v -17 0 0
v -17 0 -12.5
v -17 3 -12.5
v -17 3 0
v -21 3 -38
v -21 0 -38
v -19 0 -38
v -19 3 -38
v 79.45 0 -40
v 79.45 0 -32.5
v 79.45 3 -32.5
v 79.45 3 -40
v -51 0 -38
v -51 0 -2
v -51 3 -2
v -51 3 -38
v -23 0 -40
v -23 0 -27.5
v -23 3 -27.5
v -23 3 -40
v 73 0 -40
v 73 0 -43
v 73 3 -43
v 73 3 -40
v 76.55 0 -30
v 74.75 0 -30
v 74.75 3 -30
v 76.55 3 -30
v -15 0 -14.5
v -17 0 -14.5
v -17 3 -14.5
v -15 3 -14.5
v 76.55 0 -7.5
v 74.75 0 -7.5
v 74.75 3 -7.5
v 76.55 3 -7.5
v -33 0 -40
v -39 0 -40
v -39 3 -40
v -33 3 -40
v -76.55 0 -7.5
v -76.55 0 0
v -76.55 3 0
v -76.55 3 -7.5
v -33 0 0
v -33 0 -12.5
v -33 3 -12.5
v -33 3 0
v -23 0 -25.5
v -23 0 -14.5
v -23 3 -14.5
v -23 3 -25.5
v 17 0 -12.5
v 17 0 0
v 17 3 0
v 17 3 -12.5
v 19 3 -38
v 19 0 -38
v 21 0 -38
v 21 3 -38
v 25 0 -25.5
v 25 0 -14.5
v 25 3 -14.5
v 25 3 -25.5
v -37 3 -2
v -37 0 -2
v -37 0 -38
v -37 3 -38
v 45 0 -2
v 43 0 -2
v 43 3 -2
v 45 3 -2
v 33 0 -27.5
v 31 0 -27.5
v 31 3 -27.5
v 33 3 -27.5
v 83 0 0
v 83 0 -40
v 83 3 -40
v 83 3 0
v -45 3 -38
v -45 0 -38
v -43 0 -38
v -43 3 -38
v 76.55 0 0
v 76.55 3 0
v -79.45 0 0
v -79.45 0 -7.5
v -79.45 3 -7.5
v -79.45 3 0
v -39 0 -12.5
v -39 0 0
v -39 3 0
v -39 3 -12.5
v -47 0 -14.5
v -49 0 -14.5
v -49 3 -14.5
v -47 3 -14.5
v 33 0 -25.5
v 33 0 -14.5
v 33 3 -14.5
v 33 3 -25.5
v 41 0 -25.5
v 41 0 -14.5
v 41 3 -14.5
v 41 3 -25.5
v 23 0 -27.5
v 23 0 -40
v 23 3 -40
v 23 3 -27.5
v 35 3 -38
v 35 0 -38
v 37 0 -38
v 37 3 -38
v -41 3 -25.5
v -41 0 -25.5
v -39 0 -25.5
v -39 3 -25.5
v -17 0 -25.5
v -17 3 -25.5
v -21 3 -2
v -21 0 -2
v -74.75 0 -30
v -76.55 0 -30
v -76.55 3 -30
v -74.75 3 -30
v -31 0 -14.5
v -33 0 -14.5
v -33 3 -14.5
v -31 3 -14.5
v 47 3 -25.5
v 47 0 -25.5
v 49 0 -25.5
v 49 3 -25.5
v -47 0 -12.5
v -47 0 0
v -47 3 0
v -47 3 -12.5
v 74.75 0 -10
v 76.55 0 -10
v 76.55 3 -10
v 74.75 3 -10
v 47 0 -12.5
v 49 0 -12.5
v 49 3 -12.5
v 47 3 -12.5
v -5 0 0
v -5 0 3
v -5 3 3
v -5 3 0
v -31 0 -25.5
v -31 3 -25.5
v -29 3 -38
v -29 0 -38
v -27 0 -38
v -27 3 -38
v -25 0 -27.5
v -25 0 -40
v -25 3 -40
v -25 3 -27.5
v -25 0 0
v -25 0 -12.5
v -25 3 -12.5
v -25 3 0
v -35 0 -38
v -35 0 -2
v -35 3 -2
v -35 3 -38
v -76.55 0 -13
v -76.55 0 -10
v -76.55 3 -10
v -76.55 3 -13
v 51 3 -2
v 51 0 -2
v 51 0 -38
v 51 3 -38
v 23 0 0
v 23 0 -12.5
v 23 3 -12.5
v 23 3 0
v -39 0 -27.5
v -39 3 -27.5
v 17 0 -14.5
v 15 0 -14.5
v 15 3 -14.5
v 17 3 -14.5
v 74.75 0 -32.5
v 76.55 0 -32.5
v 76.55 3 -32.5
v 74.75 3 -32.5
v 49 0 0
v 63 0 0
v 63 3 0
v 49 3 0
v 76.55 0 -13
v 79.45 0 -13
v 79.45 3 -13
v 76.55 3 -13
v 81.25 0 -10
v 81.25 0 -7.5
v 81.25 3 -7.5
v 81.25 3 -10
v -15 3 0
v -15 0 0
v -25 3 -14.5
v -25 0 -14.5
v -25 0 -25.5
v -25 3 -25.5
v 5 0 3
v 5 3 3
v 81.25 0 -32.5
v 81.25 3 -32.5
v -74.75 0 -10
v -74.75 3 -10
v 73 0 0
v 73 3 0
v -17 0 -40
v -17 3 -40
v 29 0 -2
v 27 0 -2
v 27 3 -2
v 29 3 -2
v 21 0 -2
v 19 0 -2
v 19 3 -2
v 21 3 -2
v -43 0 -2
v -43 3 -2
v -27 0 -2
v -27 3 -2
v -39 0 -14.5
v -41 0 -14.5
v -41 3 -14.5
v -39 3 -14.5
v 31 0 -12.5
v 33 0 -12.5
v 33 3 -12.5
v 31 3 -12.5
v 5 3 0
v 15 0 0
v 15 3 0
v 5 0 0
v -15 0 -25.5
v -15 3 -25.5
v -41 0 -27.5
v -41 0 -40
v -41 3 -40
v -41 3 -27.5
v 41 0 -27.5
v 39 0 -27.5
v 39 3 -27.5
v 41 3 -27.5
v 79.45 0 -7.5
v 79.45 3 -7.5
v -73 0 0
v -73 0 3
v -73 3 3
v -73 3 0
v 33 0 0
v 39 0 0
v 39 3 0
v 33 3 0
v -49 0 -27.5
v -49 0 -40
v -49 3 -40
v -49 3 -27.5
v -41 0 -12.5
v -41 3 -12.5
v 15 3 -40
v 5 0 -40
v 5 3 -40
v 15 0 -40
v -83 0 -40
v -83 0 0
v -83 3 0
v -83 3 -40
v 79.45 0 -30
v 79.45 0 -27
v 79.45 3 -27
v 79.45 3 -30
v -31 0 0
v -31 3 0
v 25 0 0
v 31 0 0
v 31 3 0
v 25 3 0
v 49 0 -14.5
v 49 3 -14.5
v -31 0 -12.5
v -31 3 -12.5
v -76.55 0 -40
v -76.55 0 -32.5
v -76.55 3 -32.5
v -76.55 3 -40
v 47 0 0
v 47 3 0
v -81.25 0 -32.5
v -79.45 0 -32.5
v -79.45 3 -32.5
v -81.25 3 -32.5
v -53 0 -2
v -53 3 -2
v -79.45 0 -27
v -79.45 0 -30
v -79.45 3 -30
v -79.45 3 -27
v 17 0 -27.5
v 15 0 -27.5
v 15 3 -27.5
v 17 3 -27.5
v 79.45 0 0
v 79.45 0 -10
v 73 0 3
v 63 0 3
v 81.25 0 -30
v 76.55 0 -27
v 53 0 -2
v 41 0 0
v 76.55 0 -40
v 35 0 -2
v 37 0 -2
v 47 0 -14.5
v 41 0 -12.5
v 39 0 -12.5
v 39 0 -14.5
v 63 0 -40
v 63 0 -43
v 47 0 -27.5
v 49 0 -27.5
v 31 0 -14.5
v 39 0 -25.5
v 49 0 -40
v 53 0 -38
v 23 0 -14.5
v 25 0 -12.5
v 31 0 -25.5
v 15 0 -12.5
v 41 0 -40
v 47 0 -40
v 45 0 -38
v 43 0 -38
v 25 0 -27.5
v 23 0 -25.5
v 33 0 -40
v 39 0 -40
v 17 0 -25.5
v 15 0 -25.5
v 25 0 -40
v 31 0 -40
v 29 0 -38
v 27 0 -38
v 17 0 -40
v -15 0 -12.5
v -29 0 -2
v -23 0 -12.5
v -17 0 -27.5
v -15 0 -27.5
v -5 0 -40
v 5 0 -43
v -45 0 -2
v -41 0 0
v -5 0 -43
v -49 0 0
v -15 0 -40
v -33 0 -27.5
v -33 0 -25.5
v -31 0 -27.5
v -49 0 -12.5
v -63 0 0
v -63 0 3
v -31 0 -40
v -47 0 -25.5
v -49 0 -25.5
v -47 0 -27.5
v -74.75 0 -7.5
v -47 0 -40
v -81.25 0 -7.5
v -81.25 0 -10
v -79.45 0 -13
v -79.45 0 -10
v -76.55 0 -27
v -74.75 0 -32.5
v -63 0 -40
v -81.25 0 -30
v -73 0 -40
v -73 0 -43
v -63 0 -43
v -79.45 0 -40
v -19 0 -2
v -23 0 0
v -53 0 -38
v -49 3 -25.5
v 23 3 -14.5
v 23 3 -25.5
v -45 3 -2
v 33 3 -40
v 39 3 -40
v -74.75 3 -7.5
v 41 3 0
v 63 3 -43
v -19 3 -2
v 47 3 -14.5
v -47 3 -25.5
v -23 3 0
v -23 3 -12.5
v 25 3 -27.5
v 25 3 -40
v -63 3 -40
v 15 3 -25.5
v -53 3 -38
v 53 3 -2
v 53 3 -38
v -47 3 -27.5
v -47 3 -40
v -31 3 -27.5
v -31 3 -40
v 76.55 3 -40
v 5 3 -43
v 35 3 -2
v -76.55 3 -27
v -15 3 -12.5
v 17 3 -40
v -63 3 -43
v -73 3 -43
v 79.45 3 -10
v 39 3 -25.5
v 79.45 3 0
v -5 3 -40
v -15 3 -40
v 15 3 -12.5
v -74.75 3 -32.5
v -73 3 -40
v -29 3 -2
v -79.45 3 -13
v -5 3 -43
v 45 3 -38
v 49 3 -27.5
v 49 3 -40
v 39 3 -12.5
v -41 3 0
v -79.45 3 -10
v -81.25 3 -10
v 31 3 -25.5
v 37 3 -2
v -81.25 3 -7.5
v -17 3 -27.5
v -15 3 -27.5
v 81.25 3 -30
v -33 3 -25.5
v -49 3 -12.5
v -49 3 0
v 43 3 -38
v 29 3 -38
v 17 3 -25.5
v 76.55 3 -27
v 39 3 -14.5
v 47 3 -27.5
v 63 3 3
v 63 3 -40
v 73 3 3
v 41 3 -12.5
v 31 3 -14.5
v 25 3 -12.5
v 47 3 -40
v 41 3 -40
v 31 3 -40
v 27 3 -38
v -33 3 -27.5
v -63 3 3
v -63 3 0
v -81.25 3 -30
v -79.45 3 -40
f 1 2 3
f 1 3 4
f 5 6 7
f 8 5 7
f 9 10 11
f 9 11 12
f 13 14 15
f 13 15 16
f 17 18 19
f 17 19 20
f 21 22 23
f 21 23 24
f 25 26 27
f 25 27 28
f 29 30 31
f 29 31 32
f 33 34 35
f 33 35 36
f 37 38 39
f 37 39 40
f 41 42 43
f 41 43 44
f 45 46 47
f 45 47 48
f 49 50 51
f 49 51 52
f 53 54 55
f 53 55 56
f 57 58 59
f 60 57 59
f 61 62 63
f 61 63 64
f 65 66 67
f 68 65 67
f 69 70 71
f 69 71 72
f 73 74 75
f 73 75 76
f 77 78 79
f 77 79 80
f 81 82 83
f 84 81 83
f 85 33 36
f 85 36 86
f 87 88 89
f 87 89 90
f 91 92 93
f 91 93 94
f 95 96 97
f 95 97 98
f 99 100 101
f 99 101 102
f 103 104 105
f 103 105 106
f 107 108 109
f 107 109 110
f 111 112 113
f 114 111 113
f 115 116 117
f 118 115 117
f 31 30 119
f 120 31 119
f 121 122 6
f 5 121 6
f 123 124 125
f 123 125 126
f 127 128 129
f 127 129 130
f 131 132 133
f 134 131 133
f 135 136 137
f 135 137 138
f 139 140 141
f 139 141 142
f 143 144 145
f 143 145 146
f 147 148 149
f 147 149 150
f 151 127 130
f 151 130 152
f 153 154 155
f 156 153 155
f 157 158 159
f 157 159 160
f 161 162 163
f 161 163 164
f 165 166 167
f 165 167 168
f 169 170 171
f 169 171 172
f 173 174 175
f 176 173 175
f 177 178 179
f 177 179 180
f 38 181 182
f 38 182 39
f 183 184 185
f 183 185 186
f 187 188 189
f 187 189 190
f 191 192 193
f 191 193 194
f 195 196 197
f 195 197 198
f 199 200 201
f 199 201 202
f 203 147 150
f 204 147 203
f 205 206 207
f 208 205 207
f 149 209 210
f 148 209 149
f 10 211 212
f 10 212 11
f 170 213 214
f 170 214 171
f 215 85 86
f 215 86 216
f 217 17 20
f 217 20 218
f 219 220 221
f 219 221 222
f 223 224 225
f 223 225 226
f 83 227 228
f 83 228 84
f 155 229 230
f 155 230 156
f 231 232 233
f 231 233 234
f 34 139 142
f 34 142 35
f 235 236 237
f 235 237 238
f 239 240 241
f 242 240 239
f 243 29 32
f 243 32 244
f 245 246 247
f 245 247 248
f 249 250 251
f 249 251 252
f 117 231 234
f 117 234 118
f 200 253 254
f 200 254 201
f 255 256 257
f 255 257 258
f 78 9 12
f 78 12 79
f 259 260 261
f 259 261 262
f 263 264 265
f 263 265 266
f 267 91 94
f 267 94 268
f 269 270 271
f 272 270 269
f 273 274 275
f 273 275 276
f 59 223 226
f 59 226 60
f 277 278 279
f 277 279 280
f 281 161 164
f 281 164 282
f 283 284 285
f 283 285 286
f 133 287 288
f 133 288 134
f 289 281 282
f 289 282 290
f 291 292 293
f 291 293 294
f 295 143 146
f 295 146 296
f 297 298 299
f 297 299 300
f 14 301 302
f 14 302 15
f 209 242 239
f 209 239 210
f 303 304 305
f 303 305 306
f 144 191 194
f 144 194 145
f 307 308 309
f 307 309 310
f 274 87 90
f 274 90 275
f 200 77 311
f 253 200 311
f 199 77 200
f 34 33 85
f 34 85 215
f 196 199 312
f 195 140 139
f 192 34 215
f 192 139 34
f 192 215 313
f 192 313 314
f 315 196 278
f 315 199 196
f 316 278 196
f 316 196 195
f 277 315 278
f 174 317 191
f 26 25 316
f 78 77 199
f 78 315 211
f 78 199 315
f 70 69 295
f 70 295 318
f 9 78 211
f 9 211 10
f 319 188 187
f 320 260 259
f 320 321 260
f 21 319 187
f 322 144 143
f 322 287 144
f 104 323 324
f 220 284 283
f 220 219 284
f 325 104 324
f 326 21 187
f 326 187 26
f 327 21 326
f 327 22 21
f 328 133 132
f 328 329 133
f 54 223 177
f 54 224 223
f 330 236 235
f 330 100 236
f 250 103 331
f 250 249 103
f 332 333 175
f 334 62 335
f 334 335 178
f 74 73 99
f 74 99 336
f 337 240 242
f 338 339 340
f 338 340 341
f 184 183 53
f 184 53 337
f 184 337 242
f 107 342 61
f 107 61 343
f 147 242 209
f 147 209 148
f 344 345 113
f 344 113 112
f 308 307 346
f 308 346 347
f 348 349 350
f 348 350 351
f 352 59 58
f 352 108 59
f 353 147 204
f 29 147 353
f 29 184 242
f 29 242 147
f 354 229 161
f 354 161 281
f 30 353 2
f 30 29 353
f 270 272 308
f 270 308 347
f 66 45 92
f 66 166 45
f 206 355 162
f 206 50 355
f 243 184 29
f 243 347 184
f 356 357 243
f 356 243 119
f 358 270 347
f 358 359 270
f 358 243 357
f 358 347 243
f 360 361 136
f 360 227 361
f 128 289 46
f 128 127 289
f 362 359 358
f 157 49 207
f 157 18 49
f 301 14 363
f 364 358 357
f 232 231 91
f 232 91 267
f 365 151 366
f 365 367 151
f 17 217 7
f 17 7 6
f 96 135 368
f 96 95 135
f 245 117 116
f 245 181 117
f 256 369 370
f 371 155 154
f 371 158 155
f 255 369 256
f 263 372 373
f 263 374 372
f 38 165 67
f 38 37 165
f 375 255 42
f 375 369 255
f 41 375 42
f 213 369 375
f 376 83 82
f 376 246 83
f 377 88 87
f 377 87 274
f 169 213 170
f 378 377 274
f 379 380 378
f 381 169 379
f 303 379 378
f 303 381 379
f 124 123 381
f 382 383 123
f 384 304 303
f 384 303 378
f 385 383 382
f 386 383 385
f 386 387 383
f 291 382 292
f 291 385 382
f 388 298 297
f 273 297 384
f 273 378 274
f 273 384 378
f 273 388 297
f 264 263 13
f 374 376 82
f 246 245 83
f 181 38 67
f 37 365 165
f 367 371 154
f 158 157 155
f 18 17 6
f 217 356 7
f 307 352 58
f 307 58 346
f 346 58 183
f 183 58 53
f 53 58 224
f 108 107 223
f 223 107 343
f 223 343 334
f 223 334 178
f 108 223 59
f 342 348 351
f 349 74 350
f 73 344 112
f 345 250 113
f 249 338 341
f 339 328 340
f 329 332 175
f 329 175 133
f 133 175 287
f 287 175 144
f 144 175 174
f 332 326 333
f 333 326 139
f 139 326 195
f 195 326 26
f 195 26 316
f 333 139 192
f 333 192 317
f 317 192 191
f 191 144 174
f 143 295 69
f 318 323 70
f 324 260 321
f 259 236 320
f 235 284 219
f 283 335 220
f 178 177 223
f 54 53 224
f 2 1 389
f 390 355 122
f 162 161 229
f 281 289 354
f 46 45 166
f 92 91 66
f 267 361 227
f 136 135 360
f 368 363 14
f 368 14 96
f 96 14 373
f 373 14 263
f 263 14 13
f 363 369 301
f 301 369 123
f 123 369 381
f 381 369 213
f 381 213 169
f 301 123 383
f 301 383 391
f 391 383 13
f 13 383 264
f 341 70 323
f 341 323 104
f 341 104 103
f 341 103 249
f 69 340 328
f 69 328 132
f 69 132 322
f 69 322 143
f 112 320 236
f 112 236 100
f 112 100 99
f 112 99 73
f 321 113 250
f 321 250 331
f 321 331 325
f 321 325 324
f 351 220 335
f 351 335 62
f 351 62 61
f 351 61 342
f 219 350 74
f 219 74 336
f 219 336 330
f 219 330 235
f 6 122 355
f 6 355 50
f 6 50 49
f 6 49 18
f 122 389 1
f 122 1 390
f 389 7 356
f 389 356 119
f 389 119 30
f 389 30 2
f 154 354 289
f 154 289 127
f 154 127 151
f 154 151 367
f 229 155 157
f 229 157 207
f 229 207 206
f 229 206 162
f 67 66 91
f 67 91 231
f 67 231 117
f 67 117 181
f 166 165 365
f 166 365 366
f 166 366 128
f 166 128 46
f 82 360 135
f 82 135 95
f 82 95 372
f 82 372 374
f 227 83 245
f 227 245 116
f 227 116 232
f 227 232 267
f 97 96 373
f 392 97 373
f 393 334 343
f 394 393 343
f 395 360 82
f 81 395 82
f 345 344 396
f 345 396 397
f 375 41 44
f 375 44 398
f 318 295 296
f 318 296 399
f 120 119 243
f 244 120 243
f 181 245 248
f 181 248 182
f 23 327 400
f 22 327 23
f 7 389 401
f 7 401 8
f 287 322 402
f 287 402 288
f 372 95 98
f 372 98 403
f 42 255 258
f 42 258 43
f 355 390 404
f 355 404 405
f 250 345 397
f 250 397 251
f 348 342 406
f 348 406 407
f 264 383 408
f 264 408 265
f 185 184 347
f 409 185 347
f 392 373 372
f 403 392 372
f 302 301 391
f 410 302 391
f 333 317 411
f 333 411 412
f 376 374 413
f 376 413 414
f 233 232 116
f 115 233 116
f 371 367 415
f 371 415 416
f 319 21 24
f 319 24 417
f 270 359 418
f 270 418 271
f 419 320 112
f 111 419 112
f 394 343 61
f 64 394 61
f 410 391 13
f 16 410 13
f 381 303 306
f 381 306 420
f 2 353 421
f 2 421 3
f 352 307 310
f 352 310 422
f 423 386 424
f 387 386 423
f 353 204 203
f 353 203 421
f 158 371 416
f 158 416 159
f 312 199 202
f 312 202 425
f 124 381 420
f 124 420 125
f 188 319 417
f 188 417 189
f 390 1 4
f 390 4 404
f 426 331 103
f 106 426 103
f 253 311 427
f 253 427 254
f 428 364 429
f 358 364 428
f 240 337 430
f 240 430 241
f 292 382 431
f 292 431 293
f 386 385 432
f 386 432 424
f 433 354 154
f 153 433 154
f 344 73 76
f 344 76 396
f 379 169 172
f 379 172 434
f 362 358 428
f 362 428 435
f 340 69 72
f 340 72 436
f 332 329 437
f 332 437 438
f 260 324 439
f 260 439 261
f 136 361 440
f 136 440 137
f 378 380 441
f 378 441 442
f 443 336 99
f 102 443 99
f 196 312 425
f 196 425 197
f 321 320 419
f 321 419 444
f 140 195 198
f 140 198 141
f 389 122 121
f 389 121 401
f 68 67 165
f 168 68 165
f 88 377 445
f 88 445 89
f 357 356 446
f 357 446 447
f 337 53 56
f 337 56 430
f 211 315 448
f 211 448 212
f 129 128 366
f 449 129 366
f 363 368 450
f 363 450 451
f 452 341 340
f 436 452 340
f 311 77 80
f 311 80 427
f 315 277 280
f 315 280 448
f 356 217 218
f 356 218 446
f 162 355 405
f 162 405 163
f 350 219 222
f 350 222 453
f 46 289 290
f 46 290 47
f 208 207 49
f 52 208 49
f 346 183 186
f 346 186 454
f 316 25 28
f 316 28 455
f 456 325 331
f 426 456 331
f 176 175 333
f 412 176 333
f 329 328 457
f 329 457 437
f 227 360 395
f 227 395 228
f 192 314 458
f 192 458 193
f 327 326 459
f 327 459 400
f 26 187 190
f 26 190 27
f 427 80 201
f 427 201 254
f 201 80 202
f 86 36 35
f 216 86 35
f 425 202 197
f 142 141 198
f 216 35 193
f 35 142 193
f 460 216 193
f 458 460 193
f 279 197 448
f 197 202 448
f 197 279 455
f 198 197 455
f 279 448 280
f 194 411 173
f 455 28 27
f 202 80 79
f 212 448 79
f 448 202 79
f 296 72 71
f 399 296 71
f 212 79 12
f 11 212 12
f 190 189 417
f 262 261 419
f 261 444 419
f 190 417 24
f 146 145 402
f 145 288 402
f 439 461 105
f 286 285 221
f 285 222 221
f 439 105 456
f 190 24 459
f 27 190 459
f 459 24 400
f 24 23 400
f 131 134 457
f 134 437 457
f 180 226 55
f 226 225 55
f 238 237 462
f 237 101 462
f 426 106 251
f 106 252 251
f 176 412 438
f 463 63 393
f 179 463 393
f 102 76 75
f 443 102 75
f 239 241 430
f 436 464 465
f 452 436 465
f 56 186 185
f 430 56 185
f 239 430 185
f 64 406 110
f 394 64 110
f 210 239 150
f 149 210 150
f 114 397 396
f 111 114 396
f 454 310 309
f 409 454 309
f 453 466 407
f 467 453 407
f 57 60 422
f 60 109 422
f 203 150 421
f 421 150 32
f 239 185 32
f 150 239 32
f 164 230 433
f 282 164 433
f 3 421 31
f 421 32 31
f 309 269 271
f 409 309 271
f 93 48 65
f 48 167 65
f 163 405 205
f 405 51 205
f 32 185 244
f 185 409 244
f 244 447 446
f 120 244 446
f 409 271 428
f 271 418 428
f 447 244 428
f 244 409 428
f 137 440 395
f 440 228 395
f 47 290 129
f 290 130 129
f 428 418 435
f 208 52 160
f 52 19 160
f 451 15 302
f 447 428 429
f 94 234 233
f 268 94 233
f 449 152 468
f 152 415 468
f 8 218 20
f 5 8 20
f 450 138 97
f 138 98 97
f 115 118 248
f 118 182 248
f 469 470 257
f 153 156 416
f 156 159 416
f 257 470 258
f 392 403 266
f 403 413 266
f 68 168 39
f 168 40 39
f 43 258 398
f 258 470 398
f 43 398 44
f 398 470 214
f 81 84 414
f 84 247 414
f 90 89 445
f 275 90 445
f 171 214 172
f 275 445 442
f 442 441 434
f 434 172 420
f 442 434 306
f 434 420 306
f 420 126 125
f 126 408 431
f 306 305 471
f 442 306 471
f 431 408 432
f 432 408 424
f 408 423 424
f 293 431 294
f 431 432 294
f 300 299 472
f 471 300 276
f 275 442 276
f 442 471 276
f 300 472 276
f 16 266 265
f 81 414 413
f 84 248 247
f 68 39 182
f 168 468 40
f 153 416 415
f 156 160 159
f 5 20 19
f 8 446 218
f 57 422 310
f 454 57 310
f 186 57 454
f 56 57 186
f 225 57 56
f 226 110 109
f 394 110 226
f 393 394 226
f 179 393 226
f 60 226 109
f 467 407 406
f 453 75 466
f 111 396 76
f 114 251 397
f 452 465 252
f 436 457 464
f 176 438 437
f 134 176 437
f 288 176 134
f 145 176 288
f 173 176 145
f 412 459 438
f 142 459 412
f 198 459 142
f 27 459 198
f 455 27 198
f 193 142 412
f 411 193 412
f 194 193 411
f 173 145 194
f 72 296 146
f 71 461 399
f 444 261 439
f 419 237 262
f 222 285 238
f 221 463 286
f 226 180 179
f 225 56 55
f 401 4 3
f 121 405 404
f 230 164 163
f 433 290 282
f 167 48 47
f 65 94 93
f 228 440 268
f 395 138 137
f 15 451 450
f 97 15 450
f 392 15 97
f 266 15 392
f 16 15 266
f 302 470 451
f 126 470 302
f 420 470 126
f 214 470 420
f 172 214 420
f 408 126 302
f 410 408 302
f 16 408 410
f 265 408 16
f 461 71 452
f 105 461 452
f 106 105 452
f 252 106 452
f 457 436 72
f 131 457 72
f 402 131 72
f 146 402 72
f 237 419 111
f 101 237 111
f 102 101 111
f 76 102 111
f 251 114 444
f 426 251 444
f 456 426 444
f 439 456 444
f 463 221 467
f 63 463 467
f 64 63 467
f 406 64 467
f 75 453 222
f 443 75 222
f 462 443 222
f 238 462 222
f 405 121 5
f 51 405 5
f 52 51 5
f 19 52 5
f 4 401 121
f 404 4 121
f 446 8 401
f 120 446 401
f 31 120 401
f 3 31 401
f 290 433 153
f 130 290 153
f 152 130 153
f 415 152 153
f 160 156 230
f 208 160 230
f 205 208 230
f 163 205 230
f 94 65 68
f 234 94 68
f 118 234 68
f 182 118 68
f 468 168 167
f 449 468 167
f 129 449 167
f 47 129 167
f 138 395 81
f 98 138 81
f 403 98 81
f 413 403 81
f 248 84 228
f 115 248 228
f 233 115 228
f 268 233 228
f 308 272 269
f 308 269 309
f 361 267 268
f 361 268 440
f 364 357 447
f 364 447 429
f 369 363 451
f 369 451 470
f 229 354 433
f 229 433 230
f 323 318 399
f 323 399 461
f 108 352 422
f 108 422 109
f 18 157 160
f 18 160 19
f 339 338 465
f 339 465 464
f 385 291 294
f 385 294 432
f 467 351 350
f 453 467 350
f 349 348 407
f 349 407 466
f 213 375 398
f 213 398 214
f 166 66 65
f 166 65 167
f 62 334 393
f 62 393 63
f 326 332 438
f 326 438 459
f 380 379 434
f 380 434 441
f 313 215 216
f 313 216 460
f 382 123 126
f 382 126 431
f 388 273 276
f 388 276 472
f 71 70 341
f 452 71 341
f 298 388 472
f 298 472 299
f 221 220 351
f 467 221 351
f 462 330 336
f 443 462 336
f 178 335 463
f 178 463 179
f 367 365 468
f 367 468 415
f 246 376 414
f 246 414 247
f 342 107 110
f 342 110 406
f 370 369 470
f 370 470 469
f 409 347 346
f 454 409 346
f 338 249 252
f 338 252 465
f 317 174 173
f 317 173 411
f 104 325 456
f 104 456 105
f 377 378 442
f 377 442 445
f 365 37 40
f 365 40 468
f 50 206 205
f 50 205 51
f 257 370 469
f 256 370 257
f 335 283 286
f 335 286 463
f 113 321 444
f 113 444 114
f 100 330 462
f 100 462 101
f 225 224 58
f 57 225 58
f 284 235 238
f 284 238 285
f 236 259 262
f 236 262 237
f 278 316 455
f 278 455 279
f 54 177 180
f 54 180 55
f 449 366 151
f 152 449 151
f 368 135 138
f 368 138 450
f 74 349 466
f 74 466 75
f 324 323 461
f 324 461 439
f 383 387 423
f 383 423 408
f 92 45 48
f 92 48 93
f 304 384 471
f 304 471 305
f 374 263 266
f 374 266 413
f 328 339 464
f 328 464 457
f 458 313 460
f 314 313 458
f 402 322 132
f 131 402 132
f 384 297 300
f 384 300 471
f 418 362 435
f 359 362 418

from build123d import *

# Parameters (mm, degrees)
SKETCH1_W           = 2
SKETCH1_H           = 36
SKETCH1_H_2         = 11
BOSS_EXTRUDE1_DEPTH = 3


with BuildPart() as part:
    # Sketch1 → Boss-Extrude1 (new body)
    with BuildSketch(Plane(origin=(0, 0, 0), x_dir=(1, 0, 0), z_dir=(0, 1, 0))):
        Polygon((-83, 40), (-79.45, 40), (-79.45, 32.5), (-81.25, 32.5), (-81.25, 30), (-79.45, 30), (-79.45, 27), (-76.55, 27), (-76.55, 30), (-74.75, 30), (-74.75, 32.5), (-76.55, 32.5), (-76.55, 40), (-73, 40), (-73, 43), (-63, 43), (-63, 40), (-49, 40), (-49, 27.5), (-47, 27.5), (-47, 40), (-41, 40), (-41, 27.5), (-39, 27.5), (-39, 40), (-33, 40), (-33, 27.5), (-31, 27.5), (-31, 40), (-25, 40), (-25, 27.5), (-23, 27.5), (-23, 40), (-17, 40), (-17, 27.5), (-15, 27.5), (-15, 40), (-5, 40), (-5, 43), (5, 43), (5, 40), (15, 40), (15, 27.5), (17, 27.5), (17, 40), (23, 40), (23, 27.5), (25, 27.5), (25, 40), (31, 40), (31, 27.5), (33, 27.5), (33, 40), (39, 40), (39, 27.5), (41, 27.5), (41, 40), (47, 40), (47, 27.5), (49, 27.5), (49, 40), (63, 40), (63, 43), (73, 43), (73, 40), (76.55, 40), (76.55, 32.5), (74.75, 32.5), (74.75, 30), (76.55, 30), (76.55, 27), (79.45, 27), (79.45, 30), (81.25, 30), (81.25, 32.5), (79.45, 32.5), (79.45, 40), (83, 40), (83, 0), (79.45, 0), (79.45, 7.5), (81.25, 7.5), (81.25, 10), (79.45, 10), (79.45, 13), (76.55, 13), (76.55, 10), (74.75, 10), (74.75, 7.5), (76.55, 7.5), (76.55, 0), (73, 0), (73, -3), (63, -3), (63, 0), (49, 0), (49, 12.5), (47, 12.5), (47, 0), (41, 0), (41, 12.5), (39, 12.5), (39, 0), (33, 0), (33, 12.5), (31, 12.5), (31, 0), (25, 0), (25, 12.5), (23, 12.5), (23, 0), (17, 0), (17, 12.5), (15, 12.5), (15, 0), (5, 0), (5, -3), (-5, -3), (-5, 0), (-15, 0), (-15, 12.5), (-17, 12.5), (-17, 0), (-23, 0), (-23, 12.5), (-25, 12.5), (-25, 0), (-31, 0), (-31, 12.5), (-33, 12.5), (-33, 0), (-39, 0), (-39, 12.5), (-41, 12.5), (-41, 0), (-47, 0), (-47, 12.5), (-49, 12.5), (-49, 0), (-63, 0), (-63, -3), (-73, -3), (-73, 0), (-76.55, 0), (-76.55, 7.5), (-74.75, 7.5), (-74.75, 10), (-76.55, 10), (-76.55, 13), (-79.45, 13), (-79.45, 10), (-81.25, 10), (-81.25, 7.5), (-79.45, 7.5), (-79.45, 0), (-83, 0), align=None)
        with Locations((-52, 20)):
            Rectangle(SKETCH1_W, SKETCH1_H, mode=Mode.SUBTRACT)
        with Locations((-44, 20)):
            Rectangle(SKETCH1_W, SKETCH1_H, mode=Mode.SUBTRACT)
        with Locations((-36, 20)):
            Rectangle(SKETCH1_W, SKETCH1_H, mode=Mode.SUBTRACT)
        with Locations((-28, 20)):
            Rectangle(SKETCH1_W, SKETCH1_H, mode=Mode.SUBTRACT)
        with Locations((-20, 20)):
            Rectangle(SKETCH1_W, SKETCH1_H, mode=Mode.SUBTRACT)
        with Locations((-48, 20)):
            Rectangle(SKETCH1_W, SKETCH1_H_2, mode=Mode.SUBTRACT)
        with Locations((-40, 20)):
            Rectangle(SKETCH1_W, SKETCH1_H_2, mode=Mode.SUBTRACT)
        with Locations((-32, 20)):
            Rectangle(SKETCH1_W, SKETCH1_H_2, mode=Mode.SUBTRACT)
        with Locations((-24, 20)):
            Rectangle(SKETCH1_W, SKETCH1_H_2, mode=Mode.SUBTRACT)
        with Locations((-16, 20)):
            Rectangle(SKETCH1_W, SKETCH1_H_2, mode=Mode.SUBTRACT)
        with Locations((16, 20)):
            Rectangle(SKETCH1_W, SKETCH1_H_2, mode=Mode.SUBTRACT)
        with Locations((20, 20)):
            Rectangle(SKETCH1_W, SKETCH1_H, mode=Mode.SUBTRACT)
        with Locations((24, 20)):
            Rectangle(SKETCH1_W, SKETCH1_H_2, mode=Mode.SUBTRACT)
        with Locations((28, 20)):
            Rectangle(SKETCH1_W, SKETCH1_H, mode=Mode.SUBTRACT)
        with Locations((32, 20)):
            Rectangle(SKETCH1_W, SKETCH1_H_2, mode=Mode.SUBTRACT)
        with Locations((36, 20)):
            Rectangle(SKETCH1_W, SKETCH1_H, mode=Mode.SUBTRACT)
        with Locations((40, 20)):
            Rectangle(SKETCH1_W, SKETCH1_H_2, mode=Mode.SUBTRACT)
        with Locations((48, 20)):
            Rectangle(SKETCH1_W, SKETCH1_H_2, mode=Mode.SUBTRACT)
        with Locations((44, 20)):
            Rectangle(SKETCH1_W, SKETCH1_H, mode=Mode.SUBTRACT)
        with Locations((52, 20)):
            Rectangle(SKETCH1_W, SKETCH1_H, mode=Mode.SUBTRACT)
    extrude(amount=BOSS_EXTRUDE1_DEPTH)


solid = part.part
